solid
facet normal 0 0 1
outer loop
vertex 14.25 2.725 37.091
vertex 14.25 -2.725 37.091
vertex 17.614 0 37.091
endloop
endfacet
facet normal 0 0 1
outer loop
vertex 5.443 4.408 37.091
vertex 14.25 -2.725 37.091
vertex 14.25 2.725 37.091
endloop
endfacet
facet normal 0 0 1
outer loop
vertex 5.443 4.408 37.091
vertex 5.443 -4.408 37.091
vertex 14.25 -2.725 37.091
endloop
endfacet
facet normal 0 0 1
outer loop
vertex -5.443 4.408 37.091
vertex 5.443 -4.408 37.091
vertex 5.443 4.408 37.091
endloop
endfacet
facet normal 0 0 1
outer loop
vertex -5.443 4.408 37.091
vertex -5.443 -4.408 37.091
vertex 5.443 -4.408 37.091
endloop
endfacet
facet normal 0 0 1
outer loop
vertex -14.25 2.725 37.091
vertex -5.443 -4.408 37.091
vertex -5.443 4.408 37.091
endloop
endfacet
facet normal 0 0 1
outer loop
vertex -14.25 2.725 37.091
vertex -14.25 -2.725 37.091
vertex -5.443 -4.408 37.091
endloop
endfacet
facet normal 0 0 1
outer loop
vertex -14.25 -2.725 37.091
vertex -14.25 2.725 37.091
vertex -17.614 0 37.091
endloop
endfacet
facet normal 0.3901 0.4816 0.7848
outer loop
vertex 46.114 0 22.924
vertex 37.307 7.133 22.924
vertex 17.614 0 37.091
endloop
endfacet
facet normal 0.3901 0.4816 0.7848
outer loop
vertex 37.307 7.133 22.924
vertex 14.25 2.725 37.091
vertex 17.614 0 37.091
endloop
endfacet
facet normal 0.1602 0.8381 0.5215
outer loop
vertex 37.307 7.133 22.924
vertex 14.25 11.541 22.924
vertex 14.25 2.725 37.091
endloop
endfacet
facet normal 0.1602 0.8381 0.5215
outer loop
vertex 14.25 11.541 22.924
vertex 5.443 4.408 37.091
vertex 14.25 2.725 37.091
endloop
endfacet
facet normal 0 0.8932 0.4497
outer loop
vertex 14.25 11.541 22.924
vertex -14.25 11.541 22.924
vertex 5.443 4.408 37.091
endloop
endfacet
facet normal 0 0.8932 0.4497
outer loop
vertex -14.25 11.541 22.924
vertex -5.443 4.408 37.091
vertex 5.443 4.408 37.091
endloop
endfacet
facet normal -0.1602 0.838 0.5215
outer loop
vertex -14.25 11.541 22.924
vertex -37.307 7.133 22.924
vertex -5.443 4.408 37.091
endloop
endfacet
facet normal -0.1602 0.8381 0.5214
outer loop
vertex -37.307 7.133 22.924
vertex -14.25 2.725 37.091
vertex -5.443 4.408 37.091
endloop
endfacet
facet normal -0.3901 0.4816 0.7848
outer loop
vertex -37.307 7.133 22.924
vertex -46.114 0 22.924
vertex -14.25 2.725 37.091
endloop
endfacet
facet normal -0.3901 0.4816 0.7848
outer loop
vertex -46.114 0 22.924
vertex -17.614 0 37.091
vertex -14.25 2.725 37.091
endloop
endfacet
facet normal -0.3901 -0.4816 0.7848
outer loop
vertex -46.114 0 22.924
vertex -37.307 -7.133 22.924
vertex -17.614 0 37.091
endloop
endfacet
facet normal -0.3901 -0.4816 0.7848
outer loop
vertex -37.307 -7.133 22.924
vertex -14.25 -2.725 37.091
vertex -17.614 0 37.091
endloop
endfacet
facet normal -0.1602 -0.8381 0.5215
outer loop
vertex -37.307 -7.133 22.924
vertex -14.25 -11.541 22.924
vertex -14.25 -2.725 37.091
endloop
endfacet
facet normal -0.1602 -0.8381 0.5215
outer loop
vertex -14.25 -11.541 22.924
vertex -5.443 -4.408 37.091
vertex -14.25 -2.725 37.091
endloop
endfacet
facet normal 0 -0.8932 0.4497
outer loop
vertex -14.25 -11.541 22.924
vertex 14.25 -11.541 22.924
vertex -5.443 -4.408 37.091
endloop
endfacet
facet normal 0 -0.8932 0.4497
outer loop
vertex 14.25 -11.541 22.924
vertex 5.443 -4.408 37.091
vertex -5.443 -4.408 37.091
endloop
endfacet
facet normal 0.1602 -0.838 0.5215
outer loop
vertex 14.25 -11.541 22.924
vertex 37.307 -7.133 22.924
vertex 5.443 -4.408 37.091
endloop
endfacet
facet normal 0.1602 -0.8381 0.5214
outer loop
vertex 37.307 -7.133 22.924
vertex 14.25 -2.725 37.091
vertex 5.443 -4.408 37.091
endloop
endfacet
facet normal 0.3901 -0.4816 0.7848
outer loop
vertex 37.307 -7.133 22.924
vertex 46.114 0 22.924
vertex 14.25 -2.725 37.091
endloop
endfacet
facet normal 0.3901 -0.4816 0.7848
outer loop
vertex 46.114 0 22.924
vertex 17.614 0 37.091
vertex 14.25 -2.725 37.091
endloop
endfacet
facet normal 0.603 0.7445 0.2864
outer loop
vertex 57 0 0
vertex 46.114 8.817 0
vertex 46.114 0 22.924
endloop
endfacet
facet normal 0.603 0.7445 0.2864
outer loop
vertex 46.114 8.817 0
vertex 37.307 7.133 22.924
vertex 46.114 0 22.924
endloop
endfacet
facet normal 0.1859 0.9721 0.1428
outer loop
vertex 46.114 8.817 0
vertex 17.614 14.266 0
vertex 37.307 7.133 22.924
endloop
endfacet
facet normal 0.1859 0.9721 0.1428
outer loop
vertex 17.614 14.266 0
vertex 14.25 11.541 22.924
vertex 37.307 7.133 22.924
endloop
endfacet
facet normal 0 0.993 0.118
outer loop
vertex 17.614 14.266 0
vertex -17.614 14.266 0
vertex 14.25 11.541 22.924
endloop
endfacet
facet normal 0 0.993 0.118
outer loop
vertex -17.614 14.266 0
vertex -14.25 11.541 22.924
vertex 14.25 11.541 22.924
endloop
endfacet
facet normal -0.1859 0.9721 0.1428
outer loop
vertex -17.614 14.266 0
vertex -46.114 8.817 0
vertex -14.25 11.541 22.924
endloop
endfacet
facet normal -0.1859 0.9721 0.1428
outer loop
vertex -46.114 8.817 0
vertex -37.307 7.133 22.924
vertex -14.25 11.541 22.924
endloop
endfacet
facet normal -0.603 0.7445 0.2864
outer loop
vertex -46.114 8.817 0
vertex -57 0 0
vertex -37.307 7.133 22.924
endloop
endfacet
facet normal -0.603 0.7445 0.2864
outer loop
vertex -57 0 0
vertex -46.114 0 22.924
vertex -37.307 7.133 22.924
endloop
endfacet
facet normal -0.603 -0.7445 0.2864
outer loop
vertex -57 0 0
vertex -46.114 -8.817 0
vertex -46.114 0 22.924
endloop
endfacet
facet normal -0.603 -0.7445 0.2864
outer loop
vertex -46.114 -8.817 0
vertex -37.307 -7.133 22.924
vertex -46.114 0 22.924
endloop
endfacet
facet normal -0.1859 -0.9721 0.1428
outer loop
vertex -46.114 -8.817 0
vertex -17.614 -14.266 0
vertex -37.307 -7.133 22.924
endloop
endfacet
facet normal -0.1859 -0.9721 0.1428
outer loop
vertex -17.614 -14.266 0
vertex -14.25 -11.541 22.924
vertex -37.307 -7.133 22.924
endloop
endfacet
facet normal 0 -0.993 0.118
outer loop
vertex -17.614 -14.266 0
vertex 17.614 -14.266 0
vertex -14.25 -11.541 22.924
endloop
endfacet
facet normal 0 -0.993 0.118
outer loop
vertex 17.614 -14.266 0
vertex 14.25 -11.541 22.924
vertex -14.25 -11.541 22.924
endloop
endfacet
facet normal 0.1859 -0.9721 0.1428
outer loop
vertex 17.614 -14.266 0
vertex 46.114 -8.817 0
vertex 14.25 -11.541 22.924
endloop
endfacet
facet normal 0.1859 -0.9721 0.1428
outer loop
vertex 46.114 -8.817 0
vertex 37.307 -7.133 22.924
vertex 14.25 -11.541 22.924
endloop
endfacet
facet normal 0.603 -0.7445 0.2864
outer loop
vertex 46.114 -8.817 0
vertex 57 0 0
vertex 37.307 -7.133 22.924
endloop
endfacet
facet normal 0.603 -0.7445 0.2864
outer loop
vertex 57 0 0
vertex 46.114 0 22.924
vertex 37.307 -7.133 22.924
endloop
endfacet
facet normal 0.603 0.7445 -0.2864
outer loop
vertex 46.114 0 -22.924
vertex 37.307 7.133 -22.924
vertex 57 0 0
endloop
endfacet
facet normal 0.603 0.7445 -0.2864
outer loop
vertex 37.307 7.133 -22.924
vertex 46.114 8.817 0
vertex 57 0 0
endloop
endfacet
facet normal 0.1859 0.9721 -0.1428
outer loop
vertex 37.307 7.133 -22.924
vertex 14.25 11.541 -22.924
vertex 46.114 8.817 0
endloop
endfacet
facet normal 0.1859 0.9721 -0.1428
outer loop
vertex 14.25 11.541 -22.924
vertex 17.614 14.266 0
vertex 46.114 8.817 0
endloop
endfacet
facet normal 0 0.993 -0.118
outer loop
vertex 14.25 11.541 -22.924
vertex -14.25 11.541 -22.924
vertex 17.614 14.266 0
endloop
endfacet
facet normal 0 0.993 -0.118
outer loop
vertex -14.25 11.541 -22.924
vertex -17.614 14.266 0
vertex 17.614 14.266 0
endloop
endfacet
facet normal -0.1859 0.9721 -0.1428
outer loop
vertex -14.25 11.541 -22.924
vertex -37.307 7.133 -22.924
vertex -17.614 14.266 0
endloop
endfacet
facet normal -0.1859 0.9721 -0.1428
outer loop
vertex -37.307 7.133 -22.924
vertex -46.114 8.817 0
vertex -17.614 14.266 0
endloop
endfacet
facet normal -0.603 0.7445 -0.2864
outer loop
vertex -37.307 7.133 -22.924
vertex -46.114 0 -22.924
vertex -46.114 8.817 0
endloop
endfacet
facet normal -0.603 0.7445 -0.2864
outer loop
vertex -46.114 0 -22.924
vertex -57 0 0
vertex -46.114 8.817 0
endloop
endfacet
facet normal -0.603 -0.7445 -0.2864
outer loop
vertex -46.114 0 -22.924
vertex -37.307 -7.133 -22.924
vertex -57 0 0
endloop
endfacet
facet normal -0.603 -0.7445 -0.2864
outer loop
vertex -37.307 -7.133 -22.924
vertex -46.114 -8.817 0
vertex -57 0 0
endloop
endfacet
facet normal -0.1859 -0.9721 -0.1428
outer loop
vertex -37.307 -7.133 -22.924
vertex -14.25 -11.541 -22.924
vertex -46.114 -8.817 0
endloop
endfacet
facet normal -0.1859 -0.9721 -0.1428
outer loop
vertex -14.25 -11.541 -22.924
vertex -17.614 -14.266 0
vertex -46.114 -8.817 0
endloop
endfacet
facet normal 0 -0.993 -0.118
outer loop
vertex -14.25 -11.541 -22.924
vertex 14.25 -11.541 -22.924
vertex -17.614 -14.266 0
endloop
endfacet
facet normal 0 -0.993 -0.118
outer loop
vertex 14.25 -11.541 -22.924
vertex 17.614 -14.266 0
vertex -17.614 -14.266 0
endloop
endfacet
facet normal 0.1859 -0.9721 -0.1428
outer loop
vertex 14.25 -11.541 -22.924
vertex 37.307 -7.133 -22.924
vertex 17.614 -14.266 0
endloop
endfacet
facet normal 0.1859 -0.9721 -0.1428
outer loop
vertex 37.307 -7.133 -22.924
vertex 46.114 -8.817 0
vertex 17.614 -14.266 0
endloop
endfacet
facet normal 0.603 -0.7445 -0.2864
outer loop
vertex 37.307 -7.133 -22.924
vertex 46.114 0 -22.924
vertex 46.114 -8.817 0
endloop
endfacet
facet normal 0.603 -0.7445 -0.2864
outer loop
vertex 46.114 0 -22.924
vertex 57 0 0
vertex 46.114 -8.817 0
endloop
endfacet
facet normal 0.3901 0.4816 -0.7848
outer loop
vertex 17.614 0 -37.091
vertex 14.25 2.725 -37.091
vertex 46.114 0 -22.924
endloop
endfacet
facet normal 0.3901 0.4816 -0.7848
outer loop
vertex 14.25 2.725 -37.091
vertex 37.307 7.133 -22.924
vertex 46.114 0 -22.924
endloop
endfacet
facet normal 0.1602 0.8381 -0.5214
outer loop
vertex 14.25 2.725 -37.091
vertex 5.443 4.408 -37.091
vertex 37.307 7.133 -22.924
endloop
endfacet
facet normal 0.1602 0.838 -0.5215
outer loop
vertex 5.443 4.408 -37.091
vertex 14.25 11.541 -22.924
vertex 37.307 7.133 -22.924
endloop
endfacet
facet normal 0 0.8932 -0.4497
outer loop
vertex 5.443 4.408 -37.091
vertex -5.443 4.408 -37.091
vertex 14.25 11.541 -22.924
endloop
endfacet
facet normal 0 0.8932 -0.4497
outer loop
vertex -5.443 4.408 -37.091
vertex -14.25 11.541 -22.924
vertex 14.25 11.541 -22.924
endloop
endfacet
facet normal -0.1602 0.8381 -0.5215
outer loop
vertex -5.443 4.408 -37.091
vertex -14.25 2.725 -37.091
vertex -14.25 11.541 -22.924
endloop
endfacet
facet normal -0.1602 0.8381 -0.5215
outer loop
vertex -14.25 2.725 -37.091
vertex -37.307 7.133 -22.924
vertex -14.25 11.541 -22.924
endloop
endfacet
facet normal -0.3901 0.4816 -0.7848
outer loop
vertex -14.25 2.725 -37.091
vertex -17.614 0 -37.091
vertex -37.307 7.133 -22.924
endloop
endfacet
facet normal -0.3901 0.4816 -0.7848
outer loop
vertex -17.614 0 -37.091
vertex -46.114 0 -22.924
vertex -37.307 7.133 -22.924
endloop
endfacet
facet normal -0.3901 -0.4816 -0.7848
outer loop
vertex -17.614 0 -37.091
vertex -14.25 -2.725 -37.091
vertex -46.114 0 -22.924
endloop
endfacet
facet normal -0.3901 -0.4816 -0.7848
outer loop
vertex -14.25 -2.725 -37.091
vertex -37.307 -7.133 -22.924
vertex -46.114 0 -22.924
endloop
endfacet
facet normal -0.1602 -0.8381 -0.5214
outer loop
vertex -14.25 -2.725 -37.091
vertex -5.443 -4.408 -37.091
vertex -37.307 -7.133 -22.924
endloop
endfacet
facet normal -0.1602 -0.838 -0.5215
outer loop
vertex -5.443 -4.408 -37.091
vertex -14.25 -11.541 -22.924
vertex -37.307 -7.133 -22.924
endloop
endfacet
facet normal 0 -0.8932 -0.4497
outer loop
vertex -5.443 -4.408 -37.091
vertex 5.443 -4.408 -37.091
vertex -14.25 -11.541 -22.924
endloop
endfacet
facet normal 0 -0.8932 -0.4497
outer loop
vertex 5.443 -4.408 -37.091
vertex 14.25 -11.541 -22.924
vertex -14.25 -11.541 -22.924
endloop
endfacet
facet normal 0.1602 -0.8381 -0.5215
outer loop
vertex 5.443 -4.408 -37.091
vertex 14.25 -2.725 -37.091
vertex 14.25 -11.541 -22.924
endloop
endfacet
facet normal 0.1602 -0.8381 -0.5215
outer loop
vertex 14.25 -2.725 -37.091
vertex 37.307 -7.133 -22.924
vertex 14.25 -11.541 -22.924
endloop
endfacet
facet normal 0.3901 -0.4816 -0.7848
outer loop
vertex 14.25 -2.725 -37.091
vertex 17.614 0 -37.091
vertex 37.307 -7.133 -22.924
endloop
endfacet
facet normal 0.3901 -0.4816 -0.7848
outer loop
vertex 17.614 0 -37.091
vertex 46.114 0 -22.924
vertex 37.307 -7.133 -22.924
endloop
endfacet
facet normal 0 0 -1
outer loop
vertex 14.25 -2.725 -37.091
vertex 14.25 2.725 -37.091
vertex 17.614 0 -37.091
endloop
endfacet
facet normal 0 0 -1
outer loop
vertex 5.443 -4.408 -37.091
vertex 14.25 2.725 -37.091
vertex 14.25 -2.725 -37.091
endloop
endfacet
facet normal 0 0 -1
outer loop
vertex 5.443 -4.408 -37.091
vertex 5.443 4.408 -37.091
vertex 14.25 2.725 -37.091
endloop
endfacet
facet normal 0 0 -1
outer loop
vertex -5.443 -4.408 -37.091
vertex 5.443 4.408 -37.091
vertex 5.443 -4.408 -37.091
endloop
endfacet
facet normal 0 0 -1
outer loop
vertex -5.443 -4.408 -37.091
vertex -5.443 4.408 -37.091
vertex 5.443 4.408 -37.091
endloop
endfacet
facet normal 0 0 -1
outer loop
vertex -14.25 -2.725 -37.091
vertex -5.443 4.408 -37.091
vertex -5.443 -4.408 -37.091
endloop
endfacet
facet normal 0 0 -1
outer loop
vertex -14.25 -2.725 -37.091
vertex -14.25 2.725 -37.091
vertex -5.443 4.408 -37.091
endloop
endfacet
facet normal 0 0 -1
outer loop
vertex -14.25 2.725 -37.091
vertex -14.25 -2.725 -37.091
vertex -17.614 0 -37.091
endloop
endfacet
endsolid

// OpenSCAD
// Generated by SolidPython 1.0.1 on 2020-07-29 00:46:53


scale(v = [19, 5, 13]) {
	sphere(r = 3);
}
/***********************************************
*********      SolidPython code:      **********
************************************************
 
# import packages: SolidPython
from solid import *
from solid.utils import *
from itertools import chain, combinations, permutations


class Resize:

    def __init__(self, scad_file):
        self.scad_file = scad_file
        #self.scad_file = import_scad(scad_file)
        # cone/cylinder param:
        self.r1 = 0
        self.r2 = 0
        self.h = 0
        # rectangular prism param:
        self.w = 0
        self.l = 0
        # ellipse param:
        self.r = 0

    # import OpenScad code (file name corresponds to shape)


    # classify shape + parameters
    def assign(self, param1, param2, param3):
        if self.scad_file == 'cone.scad':
            self.r1 = param1
            self.r2 = param2
            self.h = param3
        elif self.scad_file == 'cylinder.scad':
            self.r1 = param1
            self.r2 = param2
            self.h = param3
        elif self.scad_file == 'rectangularPrism.scad':
            self.h = param1
            self.l = param2
            self.w = param3
        else:
            self.r = param1
            self.h = param2

    # resize parameters
    def iterate(self):
        x = range(3, 20, 2)
        i = 1
        if self.scad_file == 'cone.scad':
            tempList = list(permutations(x, 2))
            for temp in tempList:
                param1 = temp[0]
                param2 = temp[1]
                filepath = 'produced_scad_files/' + 'cone' + str(param1) + '_' + str(param2) + '_' + '.scad'
                scad_render_to_file(cylinder(h=param1, r1=param2, r2=0), filepath)

        elif self.scad_file == 'cylinder.scad':
            tempList = list(permutations(x, 3))
            for temp in tempList:
                param1 = temp[0]
                param2 = temp[1]
                filepath = 'produced_scad_files/' + 'cylinder' + str(param1) + '_' + str(param2) + '_' + '.scad'
                scad_render_to_file(cylinder(h=param1, r1=param2, r2=param2), filepath)

        elif self.scad_file == 'rectangularPrism.scad':
            tempList = list(permutations(x, 3))
            for temp in tempList:
                param1 = temp[0]
                param2 = temp[1]
                param3 = temp[2]
                filepath = 'produced_scad_files/' + 'rectangularPrism' + str(param1) + '_' + str(param2) + '_' + str(
                    param3) + '.scad'
                scad_render_to_file(cube(size=(param1, param2, param3)), filepath)

        elif self.scad_file == 'ellipse.scad':
            tempList = list(permutations(x, 4))
            for temp in tempList:
                param1 = temp[0]
                param2 = temp[1]
                param3 = temp[2]
                param4 = temp[3]
                filepath = 'produced_scad_files/' + 'ellipse' + str(param1) + '_' + str(param2) + '_' + str(param3) + '_' + str(param4) + '.scad'
                scad_render_to_file(scale([param1, param2, param3])(sphere(r=param4)), filepath)

    def render_to_scadfile(self):
        scad_render_to_file(scad, 'example.scad') 
 
************************************************/
